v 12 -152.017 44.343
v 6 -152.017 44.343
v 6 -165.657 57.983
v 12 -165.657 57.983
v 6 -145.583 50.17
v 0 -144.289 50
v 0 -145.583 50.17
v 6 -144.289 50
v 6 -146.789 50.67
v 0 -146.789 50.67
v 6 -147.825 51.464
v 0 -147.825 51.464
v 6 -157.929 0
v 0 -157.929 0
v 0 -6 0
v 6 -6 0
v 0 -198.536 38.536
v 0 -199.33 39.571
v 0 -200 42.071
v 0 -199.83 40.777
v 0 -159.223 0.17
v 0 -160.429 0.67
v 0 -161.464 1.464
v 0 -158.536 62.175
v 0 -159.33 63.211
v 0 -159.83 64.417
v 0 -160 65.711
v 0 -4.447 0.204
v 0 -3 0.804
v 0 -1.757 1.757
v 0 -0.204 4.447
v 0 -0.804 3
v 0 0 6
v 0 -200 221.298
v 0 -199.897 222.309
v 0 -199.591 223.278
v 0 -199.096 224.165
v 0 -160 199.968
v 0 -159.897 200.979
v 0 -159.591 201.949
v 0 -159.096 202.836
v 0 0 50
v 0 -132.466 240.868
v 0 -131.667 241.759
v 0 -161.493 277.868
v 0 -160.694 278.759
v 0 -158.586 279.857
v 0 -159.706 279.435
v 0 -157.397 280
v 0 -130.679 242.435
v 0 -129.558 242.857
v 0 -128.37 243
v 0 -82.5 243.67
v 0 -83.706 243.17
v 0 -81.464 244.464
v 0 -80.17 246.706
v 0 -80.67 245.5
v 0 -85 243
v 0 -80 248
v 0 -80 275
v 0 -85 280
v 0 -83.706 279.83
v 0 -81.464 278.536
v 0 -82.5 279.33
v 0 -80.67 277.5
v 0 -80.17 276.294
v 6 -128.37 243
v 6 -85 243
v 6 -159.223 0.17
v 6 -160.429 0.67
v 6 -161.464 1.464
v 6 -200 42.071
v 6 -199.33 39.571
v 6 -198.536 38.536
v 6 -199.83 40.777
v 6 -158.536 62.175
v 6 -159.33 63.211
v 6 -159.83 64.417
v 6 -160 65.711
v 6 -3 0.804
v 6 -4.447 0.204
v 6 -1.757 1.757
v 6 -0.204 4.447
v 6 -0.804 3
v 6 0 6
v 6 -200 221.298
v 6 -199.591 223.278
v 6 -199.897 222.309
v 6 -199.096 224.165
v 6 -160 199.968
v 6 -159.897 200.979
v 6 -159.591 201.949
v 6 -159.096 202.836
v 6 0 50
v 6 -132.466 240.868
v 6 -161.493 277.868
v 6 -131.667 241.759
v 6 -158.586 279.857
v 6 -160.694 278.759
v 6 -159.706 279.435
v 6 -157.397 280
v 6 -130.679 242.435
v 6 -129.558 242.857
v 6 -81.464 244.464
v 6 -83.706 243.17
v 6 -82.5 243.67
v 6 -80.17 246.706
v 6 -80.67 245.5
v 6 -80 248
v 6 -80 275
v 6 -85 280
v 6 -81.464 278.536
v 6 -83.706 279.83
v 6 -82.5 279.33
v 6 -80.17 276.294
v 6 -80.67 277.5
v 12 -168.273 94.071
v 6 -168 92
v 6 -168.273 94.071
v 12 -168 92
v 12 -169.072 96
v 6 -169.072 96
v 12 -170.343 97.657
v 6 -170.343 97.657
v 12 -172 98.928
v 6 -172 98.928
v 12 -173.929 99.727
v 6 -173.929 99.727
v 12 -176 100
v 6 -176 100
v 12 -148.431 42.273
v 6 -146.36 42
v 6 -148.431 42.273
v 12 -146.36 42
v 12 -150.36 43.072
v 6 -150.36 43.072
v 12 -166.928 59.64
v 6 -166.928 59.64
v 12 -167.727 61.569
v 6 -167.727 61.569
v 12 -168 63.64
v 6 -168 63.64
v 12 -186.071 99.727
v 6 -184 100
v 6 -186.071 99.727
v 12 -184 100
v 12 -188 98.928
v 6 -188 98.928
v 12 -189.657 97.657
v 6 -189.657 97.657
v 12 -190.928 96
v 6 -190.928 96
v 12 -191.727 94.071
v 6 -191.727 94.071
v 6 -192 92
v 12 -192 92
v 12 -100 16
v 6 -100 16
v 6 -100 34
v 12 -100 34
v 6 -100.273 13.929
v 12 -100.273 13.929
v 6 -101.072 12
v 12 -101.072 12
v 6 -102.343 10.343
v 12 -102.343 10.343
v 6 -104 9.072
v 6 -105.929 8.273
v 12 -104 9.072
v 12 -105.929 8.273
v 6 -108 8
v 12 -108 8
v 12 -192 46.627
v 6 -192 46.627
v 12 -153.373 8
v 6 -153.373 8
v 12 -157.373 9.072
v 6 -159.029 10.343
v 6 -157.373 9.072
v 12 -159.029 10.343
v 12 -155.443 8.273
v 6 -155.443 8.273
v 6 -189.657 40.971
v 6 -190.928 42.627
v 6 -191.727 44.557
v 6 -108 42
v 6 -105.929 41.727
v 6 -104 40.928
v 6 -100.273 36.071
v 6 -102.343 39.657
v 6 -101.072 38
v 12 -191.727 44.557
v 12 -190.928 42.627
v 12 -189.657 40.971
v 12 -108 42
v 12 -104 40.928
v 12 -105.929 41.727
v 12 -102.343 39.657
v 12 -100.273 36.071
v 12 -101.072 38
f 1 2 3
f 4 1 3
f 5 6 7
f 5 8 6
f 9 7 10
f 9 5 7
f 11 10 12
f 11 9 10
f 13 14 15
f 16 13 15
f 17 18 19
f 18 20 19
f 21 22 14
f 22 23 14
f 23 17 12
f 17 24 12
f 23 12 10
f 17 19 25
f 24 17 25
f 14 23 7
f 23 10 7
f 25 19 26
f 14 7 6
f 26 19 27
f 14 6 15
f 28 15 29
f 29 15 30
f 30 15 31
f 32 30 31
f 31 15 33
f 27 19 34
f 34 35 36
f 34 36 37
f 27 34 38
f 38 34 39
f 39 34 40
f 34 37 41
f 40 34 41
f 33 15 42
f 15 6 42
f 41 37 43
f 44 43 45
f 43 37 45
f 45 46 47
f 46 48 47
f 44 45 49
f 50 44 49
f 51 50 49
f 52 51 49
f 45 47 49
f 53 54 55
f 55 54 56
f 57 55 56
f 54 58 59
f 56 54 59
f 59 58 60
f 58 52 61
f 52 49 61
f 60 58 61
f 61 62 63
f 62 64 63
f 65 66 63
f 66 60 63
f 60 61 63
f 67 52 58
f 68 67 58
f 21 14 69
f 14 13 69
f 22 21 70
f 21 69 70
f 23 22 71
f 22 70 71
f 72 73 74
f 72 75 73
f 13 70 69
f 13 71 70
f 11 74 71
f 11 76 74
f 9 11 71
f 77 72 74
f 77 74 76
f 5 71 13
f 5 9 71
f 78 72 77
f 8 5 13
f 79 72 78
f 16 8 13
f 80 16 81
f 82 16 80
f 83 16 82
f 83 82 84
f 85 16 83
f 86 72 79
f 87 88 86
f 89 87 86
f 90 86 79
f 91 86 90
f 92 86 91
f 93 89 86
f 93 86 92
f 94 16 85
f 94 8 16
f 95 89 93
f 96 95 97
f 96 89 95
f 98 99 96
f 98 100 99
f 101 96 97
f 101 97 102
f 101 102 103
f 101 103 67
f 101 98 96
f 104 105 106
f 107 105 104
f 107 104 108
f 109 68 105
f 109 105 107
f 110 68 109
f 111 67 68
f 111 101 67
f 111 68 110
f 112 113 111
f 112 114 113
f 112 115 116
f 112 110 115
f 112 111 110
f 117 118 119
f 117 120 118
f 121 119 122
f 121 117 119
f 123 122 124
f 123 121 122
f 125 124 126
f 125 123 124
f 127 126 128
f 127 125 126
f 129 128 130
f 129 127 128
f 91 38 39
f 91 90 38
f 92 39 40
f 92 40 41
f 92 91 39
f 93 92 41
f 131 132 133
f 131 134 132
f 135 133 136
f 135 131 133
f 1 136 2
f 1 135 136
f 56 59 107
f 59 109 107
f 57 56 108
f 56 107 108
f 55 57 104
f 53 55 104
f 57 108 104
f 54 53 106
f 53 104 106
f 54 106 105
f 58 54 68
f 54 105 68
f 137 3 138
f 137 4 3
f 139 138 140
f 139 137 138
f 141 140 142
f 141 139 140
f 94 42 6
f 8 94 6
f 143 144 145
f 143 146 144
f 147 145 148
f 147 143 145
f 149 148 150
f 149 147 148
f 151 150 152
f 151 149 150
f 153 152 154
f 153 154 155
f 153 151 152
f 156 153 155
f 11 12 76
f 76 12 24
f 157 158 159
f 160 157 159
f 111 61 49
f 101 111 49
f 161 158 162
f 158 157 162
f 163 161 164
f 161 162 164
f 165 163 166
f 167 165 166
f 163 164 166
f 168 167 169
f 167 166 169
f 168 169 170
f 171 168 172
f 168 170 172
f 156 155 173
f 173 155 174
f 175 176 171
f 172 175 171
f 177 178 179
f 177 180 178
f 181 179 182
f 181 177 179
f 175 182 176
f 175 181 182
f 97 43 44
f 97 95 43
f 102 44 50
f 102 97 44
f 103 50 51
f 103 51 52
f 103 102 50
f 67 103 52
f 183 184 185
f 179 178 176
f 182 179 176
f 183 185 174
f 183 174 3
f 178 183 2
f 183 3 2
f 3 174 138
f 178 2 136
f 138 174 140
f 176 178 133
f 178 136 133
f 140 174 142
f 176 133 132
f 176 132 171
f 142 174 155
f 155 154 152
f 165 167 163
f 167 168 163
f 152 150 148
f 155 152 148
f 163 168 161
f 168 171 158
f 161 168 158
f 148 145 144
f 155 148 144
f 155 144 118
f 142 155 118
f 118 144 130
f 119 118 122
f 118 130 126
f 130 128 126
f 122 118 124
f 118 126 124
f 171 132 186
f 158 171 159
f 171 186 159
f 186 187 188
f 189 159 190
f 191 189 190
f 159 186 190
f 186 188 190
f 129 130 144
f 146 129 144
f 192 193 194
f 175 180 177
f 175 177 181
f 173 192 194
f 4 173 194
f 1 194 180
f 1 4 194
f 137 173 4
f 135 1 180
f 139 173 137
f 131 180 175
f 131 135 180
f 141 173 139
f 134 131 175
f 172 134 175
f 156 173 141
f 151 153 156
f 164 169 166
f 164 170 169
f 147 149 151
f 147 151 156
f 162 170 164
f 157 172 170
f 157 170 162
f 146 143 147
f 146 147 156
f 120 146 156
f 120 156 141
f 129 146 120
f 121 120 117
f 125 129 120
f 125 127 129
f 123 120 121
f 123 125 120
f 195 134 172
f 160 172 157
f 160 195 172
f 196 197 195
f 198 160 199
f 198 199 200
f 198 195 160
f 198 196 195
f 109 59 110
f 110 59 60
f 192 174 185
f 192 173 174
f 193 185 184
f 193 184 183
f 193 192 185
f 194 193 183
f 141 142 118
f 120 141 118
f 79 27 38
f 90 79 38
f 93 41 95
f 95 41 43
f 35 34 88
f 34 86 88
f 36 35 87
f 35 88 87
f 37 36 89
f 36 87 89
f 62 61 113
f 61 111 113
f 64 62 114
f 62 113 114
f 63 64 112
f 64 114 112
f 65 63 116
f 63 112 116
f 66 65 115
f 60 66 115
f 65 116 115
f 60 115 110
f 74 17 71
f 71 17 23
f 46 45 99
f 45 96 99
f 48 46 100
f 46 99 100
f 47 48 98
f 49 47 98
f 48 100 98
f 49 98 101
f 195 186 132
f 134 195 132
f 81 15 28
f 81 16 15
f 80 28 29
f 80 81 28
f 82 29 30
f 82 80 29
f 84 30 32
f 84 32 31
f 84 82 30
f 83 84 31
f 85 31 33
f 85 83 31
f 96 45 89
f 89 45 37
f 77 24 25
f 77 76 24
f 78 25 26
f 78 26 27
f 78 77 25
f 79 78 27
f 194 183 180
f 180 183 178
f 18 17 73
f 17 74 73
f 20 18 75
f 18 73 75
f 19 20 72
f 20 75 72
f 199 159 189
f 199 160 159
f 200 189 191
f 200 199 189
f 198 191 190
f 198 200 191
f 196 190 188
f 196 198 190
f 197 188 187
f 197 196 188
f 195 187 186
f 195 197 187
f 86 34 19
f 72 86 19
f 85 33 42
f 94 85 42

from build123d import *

# Parameters (mm, degrees)
F1_DEPTH = 6
F2_R     = 6
F3_R     = 5
F5_DEPTH = 6
F6_R     = 8


with BuildPart() as f1:
    # F0 (on Right) → F1 (new body)
    with BuildSketch(Plane.YZ):
        Polygon((-160, 0), (0, 0), (0, 50), (-146.36039, 50), (-160, 63.63961), (-160, 201.544894), (-130.972822, 243), (-80, 243), (-80, 280), (-160, 280), (-200, 222.87408), (-200, 40), align=None)
    extrude(amount=F1_DEPTH)

    # F2
    f2_edges = [f1.edges().sort_by_distance(p)[0] for p in [
        (3, 0, 0),
    ]]
    fillet(f2_edges, radius=F2_R)

    # F3
    f3_edges = [f1.edges().sort_by_distance(p)[0] for p in [
        (3, -146.36039, 50),
        (3, -160, 63.63961),
        (3, -130.972822, 243),
        (3, -160, 201.544894),
        (3, -160, 280),
        (3, -200, 222.87408),
        (3, -160, 0),
        (3, -200, 40),
        (3, -80, 280),
        (3, -80, 243),
    ]]
    fillet(f3_edges, radius=F3_R)


with BuildPart() as f5:
    # F4 (on face) → F5 (new body)
    with BuildSketch(Plane.YZ.offset(6)):
        Polygon((-100, 8), (-100, 42), (-149.674098, 42), (-168, 60.325902), (-168, 100), (-192, 100), (-192, 43.313708), (-156.686292, 8), align=None)
    extrude(amount=F5_DEPTH)

    # F6
    f6_edges = [f5.edges().sort_by_distance(p)[0] for p in [
        (9, -168, 100),
        (9, -192, 100),
        (9, -168, 60.325902),
        (9, -149.674098, 42),
        (9, -100, 42),
        (9, -100, 8),
        (9, -156.686292, 8),
        (9, -192, 43.313708),
    ]]
    fillet(f6_edges, radius=F6_R)


solid = Compound([f1.part, f5.part])
